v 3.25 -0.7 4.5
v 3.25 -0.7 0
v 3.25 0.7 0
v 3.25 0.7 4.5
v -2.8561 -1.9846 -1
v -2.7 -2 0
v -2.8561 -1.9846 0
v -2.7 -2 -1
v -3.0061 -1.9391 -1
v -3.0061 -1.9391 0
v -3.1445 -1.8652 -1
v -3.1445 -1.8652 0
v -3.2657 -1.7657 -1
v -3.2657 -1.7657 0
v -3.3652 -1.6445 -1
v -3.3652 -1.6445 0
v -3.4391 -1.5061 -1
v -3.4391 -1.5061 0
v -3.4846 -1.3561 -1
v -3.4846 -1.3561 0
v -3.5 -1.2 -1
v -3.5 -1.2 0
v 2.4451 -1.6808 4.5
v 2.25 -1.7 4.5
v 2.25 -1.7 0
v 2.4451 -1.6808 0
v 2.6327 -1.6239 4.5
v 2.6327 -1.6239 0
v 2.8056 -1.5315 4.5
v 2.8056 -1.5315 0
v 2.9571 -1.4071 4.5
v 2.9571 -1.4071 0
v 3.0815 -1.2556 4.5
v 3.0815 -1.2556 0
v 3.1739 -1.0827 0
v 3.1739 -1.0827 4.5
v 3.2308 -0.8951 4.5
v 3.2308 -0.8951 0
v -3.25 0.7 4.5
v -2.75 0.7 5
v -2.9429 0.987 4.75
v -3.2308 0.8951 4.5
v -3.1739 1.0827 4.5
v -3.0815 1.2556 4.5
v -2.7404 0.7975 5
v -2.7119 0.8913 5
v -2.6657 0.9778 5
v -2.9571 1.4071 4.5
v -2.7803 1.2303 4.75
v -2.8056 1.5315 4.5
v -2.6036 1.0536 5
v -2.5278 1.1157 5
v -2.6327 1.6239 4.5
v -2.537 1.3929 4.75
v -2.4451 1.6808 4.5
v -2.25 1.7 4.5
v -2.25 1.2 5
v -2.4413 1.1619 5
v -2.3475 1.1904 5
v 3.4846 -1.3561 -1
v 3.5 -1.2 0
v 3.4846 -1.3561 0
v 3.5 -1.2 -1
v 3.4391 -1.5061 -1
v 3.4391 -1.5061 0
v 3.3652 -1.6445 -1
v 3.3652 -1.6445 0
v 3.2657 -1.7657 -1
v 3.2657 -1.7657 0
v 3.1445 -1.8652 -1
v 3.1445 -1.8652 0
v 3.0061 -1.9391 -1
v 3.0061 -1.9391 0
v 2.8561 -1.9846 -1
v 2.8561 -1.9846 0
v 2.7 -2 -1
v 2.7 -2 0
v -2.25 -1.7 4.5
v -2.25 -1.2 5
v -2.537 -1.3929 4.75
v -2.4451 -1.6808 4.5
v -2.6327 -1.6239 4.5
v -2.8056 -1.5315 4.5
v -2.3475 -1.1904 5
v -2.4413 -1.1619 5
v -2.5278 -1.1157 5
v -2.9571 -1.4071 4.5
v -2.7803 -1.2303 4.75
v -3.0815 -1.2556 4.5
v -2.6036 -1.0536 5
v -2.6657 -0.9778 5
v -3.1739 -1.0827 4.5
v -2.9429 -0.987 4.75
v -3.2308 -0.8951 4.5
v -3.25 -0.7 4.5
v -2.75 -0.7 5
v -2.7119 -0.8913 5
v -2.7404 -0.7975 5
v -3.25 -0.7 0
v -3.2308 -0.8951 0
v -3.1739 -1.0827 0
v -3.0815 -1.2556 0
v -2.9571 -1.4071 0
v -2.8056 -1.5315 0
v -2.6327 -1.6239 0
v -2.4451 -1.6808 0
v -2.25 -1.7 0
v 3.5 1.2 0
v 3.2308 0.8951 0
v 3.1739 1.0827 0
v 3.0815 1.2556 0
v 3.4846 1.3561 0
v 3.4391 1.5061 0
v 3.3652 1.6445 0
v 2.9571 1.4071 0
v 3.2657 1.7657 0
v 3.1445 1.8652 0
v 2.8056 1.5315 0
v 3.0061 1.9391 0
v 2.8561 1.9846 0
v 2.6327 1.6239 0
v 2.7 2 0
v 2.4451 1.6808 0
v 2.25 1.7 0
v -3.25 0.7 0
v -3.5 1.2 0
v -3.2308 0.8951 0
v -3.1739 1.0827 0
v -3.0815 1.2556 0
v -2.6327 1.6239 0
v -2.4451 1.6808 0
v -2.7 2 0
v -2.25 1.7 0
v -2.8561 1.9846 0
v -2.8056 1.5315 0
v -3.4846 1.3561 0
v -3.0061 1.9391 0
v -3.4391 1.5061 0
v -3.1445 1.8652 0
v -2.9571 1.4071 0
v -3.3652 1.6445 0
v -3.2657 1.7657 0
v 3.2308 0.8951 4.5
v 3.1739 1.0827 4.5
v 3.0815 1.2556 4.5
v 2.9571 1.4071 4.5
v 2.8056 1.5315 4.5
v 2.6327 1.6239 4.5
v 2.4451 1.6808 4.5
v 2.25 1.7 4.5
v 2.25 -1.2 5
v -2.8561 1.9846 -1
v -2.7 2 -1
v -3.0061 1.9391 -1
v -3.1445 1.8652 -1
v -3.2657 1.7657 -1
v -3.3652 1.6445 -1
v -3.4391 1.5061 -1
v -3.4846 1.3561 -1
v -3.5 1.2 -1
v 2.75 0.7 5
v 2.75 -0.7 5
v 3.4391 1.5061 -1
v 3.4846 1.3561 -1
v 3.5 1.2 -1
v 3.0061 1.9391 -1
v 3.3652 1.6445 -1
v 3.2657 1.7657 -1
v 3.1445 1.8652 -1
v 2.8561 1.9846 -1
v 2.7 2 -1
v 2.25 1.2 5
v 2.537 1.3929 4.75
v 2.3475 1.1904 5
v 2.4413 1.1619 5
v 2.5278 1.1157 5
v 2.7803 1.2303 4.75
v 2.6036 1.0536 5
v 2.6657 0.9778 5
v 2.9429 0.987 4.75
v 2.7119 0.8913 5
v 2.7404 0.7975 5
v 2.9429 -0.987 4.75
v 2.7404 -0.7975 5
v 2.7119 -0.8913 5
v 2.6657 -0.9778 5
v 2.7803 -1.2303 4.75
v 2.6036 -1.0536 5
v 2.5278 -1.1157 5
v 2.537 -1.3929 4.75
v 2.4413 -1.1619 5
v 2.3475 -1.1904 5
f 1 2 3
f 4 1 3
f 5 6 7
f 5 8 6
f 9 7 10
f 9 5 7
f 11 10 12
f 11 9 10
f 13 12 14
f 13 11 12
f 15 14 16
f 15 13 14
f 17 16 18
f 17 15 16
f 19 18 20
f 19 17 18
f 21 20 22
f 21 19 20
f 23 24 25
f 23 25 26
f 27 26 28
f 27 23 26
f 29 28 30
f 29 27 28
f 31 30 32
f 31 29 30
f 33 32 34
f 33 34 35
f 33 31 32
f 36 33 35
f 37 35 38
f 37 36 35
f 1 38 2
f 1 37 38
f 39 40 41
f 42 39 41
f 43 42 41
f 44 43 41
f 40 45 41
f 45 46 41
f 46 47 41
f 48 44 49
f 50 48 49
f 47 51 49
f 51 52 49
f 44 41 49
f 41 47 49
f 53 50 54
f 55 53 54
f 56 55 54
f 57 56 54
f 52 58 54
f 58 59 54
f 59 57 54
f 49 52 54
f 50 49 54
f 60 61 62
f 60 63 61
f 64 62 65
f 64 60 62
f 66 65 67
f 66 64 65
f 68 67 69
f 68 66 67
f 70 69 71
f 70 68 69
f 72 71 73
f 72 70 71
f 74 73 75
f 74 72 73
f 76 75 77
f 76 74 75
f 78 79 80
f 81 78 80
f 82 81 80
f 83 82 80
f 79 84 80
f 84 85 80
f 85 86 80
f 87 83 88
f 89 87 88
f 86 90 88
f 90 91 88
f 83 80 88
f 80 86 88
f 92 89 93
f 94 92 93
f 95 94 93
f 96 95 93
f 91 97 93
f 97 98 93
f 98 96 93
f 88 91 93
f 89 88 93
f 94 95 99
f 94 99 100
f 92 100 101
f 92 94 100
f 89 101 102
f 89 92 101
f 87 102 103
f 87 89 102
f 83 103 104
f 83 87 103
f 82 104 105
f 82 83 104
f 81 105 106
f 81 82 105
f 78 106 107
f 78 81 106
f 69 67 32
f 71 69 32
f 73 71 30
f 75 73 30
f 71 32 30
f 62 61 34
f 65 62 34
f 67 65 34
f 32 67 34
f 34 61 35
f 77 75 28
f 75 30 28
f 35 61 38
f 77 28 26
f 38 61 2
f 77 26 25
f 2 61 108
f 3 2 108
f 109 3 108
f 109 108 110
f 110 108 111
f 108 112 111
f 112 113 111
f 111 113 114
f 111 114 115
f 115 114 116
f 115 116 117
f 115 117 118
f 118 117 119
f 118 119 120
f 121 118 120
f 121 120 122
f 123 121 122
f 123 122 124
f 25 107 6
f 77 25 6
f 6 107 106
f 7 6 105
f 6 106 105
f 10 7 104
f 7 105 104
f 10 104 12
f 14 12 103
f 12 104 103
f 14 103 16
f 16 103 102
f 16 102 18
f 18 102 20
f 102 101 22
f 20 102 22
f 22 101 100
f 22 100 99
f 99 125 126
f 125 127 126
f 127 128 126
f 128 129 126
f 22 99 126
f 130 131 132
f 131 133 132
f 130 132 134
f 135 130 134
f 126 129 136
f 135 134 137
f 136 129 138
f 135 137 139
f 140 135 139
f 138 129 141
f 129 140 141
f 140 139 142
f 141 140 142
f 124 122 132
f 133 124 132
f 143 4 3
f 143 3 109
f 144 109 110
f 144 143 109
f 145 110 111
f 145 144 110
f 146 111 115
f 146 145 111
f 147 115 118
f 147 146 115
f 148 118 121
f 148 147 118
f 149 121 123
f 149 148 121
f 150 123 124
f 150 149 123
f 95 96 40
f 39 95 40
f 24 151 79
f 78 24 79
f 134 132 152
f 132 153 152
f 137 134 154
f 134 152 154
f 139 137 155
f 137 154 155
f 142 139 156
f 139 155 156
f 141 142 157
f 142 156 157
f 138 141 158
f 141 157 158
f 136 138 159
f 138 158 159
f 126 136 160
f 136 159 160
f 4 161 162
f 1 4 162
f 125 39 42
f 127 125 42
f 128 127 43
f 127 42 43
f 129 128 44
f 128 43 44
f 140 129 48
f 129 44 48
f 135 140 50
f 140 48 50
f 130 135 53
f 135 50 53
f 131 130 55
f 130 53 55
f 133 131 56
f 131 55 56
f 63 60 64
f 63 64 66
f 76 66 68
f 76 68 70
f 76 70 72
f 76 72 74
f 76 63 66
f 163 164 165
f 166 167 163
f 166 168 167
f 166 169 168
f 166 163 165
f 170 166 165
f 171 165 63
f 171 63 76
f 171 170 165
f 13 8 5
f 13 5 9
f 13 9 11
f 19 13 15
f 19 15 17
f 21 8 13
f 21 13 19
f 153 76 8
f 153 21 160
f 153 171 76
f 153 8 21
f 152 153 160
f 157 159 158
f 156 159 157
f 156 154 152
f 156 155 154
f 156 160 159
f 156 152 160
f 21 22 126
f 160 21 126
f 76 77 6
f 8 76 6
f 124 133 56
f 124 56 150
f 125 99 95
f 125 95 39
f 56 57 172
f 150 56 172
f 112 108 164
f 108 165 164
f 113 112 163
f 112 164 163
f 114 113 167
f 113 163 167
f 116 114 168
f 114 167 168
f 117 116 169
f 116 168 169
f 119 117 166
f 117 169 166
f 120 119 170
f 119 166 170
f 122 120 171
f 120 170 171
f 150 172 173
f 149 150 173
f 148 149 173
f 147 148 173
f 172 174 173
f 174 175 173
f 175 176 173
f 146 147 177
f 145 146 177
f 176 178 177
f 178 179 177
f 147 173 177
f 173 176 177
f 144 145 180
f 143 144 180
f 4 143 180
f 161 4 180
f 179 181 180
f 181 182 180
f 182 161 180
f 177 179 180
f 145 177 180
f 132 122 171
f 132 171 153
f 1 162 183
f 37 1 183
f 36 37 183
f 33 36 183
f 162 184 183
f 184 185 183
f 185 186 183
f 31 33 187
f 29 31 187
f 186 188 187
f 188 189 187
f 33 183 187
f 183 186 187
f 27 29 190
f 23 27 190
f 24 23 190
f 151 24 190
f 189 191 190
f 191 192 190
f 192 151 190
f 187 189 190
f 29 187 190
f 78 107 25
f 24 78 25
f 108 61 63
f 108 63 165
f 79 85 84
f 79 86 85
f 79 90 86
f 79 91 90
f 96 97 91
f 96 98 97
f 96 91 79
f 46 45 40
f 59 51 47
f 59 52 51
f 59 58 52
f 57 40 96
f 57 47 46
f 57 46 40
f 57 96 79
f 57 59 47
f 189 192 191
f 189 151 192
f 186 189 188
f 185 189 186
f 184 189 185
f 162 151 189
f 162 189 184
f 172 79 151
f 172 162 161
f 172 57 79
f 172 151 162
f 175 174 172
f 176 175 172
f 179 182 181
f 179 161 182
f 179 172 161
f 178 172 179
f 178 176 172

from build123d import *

# Parameters (mm, degrees)
SKETCH_1_W      = 6.5
SKETCH_1_H      = 3.4
EXTRUDE_1_DEPTH = 5
FILLET_1_R      = 1
CHAMFER_1_SIZE  = 0.5
SKETCH_2_W      = 7
SKETCH_2_H      = 4
EXTRUDE_2_DEPTH = 1
FILLET_2_R      = 0.8


with BuildPart() as part:
    # 草图1 → 凸台-拉伸1 (new body)
    with BuildSketch(Plane.XY):
        Rectangle(SKETCH_1_W, SKETCH_1_H)
    extrude(amount=EXTRUDE_1_DEPTH)

    # 圆角1
    fillet_1_edges = [part.edges().sort_by_distance(p)[0] for p in [
        (3.25, -1.7, 2.5),
        (-3.25, -1.7, 2.5),
        (-3.25, 1.7, 2.5),
        (3.25, 1.7, 2.5),
    ]]
    fillet(fillet_1_edges, radius=FILLET_1_R)

    # 倒角1
    chamfer_1_edges = [part.edges().sort_by_distance(p)[0] for p in [
        (-3.25, 0, 5),
        (0, 1.7, 5),
        (3.25, 0, 5),
        (0, -1.7, 5),
        (-2.957106781, -1.407106781, 5),
        (2.957106781, -1.407106781, 5),
        (2.957106781, 1.407106781, 5),
        (-2.957106781, 1.407106781, 5),
    ]]
    chamfer(chamfer_1_edges, length=CHAMFER_1_SIZE)

    # 草图2 → 凸台-拉伸2 (add)
    with BuildSketch(Plane(origin=(0, 0, 0), x_dir=(-1, 0, 0), z_dir=(0, 0, -1))):
        Rectangle(SKETCH_2_W, SKETCH_2_H)
    extrude(amount=EXTRUDE_2_DEPTH)

    # 圆角2
    fillet_2_edges = [part.edges().sort_by_distance(p)[0] for p in [
        (3.5, 2, -0.5),
        (3.5, -2, -0.5),
        (-3.5, -2, -0.5),
        (-3.5, 2, -0.5),
    ]]
    fillet(fillet_2_edges, radius=FILLET_2_R)


solid = part.part
